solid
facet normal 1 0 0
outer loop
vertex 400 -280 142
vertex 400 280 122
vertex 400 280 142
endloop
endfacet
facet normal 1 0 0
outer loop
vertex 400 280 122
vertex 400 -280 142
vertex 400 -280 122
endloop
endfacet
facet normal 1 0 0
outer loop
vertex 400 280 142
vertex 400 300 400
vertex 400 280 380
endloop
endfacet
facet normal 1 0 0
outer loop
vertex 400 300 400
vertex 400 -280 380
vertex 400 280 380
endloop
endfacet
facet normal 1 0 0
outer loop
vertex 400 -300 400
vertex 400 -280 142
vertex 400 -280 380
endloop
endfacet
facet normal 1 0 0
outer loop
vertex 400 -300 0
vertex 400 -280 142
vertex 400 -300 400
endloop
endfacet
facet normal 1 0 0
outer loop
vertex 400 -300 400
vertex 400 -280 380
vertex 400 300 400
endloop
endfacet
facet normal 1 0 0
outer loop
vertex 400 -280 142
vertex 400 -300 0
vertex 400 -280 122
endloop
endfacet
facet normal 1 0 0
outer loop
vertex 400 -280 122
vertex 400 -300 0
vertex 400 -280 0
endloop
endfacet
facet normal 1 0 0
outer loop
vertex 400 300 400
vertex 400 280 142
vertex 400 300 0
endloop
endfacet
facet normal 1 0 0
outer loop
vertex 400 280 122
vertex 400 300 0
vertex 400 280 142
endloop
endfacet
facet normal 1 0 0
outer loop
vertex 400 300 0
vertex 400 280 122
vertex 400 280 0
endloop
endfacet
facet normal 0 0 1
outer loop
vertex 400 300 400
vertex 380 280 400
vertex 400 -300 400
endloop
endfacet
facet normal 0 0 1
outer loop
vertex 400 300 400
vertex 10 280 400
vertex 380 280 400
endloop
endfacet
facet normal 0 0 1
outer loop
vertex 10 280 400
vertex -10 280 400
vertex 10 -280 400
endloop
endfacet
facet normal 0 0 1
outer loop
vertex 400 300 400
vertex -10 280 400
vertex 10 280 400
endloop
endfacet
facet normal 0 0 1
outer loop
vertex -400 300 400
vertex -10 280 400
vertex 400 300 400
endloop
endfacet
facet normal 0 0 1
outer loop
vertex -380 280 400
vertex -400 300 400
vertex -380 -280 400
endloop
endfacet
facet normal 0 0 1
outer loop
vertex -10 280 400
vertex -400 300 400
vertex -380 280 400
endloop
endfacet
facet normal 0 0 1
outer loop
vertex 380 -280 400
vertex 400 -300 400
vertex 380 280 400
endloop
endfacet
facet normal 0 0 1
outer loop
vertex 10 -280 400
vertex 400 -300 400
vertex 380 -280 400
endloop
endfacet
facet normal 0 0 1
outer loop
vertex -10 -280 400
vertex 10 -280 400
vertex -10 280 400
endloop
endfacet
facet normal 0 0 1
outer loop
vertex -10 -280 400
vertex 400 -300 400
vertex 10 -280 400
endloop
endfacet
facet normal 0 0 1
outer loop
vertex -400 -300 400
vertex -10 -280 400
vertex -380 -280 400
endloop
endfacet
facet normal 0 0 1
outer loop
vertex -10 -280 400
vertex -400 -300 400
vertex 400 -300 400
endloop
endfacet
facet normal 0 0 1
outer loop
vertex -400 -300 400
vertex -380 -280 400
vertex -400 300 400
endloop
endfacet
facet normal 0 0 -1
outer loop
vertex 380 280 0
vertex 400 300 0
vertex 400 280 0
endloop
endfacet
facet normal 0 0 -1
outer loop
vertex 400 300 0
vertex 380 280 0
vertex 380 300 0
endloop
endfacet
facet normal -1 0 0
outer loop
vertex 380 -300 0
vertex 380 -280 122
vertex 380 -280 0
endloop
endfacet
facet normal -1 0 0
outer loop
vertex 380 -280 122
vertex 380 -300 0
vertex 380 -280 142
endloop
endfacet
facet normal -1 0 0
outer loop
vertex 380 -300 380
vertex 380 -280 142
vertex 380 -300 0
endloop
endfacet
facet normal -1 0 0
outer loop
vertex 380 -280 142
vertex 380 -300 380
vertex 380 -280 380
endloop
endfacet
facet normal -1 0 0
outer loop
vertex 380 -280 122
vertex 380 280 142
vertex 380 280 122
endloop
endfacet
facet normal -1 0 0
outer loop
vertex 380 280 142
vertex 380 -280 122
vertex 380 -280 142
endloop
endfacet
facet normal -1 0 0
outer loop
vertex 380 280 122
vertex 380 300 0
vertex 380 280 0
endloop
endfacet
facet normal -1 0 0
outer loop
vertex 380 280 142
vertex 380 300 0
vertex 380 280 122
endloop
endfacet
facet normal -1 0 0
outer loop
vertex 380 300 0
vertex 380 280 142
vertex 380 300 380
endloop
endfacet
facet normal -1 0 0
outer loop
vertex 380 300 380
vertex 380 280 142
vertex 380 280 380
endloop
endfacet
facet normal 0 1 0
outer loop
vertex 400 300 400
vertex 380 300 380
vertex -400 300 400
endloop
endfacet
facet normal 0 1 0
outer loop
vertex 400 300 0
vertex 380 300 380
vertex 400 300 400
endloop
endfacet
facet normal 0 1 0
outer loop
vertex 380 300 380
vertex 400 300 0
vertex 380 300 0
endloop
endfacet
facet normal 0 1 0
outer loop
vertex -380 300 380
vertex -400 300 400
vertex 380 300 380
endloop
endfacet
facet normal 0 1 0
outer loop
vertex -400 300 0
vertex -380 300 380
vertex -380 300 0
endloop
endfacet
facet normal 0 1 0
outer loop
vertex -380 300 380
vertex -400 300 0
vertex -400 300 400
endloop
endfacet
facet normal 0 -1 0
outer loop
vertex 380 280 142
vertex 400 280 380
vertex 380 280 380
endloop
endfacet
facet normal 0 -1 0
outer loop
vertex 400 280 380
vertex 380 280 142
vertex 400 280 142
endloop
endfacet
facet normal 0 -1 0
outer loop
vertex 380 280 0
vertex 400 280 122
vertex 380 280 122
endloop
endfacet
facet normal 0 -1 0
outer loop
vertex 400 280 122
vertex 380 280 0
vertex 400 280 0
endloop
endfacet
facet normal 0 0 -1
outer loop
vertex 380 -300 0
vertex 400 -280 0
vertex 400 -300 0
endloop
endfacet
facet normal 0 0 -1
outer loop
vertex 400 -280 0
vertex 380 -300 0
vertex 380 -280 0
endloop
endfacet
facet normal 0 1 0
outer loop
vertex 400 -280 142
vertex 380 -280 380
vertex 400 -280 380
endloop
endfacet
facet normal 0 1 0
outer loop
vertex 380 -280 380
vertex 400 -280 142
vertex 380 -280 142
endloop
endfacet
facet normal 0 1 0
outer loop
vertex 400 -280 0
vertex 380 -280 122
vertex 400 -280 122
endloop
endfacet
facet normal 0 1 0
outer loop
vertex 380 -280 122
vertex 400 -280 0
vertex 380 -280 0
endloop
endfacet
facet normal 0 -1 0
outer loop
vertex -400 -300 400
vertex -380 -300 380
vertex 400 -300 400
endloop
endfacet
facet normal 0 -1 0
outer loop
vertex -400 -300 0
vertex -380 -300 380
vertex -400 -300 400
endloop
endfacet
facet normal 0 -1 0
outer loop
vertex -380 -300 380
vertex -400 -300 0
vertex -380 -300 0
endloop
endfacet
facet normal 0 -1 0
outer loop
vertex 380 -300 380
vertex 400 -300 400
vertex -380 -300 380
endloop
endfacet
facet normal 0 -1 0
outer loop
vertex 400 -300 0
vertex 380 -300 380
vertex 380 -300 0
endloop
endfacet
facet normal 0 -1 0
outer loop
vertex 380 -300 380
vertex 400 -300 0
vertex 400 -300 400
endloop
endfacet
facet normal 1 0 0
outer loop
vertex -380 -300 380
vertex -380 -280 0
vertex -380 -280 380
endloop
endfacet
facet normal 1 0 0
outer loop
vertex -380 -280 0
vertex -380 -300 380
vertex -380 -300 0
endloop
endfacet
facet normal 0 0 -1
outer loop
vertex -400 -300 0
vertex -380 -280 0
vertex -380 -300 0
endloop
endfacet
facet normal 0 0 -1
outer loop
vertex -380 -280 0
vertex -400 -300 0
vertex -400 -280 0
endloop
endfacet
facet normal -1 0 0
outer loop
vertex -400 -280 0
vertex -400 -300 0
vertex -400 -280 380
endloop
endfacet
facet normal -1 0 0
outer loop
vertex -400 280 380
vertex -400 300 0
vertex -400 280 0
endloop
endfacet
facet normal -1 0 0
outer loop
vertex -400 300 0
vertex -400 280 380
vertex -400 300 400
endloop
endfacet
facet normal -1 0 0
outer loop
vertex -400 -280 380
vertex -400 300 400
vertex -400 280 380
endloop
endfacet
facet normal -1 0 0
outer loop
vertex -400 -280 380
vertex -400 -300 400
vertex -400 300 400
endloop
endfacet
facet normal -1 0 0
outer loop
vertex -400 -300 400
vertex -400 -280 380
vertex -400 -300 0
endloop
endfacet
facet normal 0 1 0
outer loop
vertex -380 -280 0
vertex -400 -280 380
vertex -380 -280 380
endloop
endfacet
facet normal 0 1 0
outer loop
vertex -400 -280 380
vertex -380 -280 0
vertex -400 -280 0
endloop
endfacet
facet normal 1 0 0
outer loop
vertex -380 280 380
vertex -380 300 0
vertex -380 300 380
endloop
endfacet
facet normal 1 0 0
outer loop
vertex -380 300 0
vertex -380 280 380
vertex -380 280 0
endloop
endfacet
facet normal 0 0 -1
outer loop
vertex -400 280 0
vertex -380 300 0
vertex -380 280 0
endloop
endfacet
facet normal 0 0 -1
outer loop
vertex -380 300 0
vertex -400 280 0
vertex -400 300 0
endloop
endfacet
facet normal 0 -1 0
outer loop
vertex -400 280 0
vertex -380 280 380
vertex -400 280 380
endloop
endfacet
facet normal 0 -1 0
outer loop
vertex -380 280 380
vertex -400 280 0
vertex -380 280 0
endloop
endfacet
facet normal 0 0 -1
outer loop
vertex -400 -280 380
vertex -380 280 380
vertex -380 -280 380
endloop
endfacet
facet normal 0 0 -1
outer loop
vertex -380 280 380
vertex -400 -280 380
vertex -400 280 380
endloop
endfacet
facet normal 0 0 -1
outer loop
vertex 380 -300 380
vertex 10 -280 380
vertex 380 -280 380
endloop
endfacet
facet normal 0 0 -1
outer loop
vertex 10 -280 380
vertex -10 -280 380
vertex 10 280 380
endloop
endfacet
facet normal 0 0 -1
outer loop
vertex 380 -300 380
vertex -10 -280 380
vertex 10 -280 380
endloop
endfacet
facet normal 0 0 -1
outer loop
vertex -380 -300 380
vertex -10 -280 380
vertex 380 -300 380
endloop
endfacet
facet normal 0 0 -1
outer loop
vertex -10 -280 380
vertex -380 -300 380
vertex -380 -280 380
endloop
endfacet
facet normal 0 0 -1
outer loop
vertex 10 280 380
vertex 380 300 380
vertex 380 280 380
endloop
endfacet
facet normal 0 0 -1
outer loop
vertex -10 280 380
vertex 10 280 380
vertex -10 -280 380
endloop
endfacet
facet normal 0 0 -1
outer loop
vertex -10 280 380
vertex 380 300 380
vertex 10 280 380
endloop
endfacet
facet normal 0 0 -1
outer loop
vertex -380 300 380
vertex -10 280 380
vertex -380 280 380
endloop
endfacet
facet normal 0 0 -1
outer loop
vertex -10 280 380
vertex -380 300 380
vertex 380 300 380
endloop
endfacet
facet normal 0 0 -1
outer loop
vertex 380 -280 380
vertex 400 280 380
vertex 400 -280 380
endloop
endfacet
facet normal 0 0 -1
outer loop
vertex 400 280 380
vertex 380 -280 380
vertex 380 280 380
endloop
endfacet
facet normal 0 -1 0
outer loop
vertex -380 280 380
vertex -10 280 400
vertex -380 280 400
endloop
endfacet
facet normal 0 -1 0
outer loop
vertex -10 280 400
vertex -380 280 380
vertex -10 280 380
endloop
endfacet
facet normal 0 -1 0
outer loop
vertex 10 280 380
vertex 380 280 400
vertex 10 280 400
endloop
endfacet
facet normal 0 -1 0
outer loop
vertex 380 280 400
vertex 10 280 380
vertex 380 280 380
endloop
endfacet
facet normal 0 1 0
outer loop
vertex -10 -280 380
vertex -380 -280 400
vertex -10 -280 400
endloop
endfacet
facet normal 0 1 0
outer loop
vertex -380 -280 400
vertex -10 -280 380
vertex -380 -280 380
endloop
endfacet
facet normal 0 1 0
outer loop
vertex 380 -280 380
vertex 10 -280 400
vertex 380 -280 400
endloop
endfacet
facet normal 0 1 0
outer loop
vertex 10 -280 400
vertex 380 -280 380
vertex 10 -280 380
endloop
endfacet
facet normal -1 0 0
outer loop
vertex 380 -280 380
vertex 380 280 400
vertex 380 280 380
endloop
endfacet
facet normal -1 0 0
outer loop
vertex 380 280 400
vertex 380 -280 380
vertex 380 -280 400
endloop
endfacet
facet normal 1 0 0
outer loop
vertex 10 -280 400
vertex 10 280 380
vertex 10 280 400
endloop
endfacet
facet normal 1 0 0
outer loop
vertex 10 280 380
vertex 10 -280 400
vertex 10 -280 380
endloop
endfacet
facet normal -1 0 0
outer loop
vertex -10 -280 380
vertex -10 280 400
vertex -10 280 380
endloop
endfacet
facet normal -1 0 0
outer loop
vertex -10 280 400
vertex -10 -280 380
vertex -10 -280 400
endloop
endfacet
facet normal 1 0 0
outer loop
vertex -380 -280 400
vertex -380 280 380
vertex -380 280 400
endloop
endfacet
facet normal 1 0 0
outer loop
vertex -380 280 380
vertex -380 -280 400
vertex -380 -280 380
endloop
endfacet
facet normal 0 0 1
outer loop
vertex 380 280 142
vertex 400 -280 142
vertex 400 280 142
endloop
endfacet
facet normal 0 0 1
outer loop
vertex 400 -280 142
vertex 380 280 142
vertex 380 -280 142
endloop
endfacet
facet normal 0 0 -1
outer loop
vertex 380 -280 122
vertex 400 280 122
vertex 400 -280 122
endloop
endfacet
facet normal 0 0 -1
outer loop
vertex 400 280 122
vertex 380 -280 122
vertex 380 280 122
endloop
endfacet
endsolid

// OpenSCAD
module Cubierta(lod=0, length=800, width=600, height=400, tube_profile=20){
    if (lod==0){
        corner_pos = [length/2 - tube_profile/2, width/2 - tube_profile/2];
        
        // POSTES
        for (xy = [[1, 1], [1, -1], [-1, -1], [-1, 1]]){
            translate([corner_pos[0]*xy[0], corner_pos[1]*xy[1], height/2])
            cube([tube_profile, tube_profile, height], center=true);
        }
        
        // LARGUEROS
        for (y = [1, -1]) {
            translate([0, y*corner_pos[1], height-tube_profile/2])    
            cube([length, tube_profile, tube_profile], center=true);
        }
        
        // TRAVESAÑOS
        // TECHO
        for (x = [1, 0, -1]) {
            translate([x*corner_pos[0], 0, height-tube_profile/2])    
            cube([tube_profile, width, tube_profile], center=true);
        }
        // FRENTE/RESPALDO
        for (x = [1]) {
            translate([x*corner_pos[0], 0, height*0.33])    
            cube([tube_profile, width, tube_profile], center=true);
        }
        
    }
}

Cubierta();
